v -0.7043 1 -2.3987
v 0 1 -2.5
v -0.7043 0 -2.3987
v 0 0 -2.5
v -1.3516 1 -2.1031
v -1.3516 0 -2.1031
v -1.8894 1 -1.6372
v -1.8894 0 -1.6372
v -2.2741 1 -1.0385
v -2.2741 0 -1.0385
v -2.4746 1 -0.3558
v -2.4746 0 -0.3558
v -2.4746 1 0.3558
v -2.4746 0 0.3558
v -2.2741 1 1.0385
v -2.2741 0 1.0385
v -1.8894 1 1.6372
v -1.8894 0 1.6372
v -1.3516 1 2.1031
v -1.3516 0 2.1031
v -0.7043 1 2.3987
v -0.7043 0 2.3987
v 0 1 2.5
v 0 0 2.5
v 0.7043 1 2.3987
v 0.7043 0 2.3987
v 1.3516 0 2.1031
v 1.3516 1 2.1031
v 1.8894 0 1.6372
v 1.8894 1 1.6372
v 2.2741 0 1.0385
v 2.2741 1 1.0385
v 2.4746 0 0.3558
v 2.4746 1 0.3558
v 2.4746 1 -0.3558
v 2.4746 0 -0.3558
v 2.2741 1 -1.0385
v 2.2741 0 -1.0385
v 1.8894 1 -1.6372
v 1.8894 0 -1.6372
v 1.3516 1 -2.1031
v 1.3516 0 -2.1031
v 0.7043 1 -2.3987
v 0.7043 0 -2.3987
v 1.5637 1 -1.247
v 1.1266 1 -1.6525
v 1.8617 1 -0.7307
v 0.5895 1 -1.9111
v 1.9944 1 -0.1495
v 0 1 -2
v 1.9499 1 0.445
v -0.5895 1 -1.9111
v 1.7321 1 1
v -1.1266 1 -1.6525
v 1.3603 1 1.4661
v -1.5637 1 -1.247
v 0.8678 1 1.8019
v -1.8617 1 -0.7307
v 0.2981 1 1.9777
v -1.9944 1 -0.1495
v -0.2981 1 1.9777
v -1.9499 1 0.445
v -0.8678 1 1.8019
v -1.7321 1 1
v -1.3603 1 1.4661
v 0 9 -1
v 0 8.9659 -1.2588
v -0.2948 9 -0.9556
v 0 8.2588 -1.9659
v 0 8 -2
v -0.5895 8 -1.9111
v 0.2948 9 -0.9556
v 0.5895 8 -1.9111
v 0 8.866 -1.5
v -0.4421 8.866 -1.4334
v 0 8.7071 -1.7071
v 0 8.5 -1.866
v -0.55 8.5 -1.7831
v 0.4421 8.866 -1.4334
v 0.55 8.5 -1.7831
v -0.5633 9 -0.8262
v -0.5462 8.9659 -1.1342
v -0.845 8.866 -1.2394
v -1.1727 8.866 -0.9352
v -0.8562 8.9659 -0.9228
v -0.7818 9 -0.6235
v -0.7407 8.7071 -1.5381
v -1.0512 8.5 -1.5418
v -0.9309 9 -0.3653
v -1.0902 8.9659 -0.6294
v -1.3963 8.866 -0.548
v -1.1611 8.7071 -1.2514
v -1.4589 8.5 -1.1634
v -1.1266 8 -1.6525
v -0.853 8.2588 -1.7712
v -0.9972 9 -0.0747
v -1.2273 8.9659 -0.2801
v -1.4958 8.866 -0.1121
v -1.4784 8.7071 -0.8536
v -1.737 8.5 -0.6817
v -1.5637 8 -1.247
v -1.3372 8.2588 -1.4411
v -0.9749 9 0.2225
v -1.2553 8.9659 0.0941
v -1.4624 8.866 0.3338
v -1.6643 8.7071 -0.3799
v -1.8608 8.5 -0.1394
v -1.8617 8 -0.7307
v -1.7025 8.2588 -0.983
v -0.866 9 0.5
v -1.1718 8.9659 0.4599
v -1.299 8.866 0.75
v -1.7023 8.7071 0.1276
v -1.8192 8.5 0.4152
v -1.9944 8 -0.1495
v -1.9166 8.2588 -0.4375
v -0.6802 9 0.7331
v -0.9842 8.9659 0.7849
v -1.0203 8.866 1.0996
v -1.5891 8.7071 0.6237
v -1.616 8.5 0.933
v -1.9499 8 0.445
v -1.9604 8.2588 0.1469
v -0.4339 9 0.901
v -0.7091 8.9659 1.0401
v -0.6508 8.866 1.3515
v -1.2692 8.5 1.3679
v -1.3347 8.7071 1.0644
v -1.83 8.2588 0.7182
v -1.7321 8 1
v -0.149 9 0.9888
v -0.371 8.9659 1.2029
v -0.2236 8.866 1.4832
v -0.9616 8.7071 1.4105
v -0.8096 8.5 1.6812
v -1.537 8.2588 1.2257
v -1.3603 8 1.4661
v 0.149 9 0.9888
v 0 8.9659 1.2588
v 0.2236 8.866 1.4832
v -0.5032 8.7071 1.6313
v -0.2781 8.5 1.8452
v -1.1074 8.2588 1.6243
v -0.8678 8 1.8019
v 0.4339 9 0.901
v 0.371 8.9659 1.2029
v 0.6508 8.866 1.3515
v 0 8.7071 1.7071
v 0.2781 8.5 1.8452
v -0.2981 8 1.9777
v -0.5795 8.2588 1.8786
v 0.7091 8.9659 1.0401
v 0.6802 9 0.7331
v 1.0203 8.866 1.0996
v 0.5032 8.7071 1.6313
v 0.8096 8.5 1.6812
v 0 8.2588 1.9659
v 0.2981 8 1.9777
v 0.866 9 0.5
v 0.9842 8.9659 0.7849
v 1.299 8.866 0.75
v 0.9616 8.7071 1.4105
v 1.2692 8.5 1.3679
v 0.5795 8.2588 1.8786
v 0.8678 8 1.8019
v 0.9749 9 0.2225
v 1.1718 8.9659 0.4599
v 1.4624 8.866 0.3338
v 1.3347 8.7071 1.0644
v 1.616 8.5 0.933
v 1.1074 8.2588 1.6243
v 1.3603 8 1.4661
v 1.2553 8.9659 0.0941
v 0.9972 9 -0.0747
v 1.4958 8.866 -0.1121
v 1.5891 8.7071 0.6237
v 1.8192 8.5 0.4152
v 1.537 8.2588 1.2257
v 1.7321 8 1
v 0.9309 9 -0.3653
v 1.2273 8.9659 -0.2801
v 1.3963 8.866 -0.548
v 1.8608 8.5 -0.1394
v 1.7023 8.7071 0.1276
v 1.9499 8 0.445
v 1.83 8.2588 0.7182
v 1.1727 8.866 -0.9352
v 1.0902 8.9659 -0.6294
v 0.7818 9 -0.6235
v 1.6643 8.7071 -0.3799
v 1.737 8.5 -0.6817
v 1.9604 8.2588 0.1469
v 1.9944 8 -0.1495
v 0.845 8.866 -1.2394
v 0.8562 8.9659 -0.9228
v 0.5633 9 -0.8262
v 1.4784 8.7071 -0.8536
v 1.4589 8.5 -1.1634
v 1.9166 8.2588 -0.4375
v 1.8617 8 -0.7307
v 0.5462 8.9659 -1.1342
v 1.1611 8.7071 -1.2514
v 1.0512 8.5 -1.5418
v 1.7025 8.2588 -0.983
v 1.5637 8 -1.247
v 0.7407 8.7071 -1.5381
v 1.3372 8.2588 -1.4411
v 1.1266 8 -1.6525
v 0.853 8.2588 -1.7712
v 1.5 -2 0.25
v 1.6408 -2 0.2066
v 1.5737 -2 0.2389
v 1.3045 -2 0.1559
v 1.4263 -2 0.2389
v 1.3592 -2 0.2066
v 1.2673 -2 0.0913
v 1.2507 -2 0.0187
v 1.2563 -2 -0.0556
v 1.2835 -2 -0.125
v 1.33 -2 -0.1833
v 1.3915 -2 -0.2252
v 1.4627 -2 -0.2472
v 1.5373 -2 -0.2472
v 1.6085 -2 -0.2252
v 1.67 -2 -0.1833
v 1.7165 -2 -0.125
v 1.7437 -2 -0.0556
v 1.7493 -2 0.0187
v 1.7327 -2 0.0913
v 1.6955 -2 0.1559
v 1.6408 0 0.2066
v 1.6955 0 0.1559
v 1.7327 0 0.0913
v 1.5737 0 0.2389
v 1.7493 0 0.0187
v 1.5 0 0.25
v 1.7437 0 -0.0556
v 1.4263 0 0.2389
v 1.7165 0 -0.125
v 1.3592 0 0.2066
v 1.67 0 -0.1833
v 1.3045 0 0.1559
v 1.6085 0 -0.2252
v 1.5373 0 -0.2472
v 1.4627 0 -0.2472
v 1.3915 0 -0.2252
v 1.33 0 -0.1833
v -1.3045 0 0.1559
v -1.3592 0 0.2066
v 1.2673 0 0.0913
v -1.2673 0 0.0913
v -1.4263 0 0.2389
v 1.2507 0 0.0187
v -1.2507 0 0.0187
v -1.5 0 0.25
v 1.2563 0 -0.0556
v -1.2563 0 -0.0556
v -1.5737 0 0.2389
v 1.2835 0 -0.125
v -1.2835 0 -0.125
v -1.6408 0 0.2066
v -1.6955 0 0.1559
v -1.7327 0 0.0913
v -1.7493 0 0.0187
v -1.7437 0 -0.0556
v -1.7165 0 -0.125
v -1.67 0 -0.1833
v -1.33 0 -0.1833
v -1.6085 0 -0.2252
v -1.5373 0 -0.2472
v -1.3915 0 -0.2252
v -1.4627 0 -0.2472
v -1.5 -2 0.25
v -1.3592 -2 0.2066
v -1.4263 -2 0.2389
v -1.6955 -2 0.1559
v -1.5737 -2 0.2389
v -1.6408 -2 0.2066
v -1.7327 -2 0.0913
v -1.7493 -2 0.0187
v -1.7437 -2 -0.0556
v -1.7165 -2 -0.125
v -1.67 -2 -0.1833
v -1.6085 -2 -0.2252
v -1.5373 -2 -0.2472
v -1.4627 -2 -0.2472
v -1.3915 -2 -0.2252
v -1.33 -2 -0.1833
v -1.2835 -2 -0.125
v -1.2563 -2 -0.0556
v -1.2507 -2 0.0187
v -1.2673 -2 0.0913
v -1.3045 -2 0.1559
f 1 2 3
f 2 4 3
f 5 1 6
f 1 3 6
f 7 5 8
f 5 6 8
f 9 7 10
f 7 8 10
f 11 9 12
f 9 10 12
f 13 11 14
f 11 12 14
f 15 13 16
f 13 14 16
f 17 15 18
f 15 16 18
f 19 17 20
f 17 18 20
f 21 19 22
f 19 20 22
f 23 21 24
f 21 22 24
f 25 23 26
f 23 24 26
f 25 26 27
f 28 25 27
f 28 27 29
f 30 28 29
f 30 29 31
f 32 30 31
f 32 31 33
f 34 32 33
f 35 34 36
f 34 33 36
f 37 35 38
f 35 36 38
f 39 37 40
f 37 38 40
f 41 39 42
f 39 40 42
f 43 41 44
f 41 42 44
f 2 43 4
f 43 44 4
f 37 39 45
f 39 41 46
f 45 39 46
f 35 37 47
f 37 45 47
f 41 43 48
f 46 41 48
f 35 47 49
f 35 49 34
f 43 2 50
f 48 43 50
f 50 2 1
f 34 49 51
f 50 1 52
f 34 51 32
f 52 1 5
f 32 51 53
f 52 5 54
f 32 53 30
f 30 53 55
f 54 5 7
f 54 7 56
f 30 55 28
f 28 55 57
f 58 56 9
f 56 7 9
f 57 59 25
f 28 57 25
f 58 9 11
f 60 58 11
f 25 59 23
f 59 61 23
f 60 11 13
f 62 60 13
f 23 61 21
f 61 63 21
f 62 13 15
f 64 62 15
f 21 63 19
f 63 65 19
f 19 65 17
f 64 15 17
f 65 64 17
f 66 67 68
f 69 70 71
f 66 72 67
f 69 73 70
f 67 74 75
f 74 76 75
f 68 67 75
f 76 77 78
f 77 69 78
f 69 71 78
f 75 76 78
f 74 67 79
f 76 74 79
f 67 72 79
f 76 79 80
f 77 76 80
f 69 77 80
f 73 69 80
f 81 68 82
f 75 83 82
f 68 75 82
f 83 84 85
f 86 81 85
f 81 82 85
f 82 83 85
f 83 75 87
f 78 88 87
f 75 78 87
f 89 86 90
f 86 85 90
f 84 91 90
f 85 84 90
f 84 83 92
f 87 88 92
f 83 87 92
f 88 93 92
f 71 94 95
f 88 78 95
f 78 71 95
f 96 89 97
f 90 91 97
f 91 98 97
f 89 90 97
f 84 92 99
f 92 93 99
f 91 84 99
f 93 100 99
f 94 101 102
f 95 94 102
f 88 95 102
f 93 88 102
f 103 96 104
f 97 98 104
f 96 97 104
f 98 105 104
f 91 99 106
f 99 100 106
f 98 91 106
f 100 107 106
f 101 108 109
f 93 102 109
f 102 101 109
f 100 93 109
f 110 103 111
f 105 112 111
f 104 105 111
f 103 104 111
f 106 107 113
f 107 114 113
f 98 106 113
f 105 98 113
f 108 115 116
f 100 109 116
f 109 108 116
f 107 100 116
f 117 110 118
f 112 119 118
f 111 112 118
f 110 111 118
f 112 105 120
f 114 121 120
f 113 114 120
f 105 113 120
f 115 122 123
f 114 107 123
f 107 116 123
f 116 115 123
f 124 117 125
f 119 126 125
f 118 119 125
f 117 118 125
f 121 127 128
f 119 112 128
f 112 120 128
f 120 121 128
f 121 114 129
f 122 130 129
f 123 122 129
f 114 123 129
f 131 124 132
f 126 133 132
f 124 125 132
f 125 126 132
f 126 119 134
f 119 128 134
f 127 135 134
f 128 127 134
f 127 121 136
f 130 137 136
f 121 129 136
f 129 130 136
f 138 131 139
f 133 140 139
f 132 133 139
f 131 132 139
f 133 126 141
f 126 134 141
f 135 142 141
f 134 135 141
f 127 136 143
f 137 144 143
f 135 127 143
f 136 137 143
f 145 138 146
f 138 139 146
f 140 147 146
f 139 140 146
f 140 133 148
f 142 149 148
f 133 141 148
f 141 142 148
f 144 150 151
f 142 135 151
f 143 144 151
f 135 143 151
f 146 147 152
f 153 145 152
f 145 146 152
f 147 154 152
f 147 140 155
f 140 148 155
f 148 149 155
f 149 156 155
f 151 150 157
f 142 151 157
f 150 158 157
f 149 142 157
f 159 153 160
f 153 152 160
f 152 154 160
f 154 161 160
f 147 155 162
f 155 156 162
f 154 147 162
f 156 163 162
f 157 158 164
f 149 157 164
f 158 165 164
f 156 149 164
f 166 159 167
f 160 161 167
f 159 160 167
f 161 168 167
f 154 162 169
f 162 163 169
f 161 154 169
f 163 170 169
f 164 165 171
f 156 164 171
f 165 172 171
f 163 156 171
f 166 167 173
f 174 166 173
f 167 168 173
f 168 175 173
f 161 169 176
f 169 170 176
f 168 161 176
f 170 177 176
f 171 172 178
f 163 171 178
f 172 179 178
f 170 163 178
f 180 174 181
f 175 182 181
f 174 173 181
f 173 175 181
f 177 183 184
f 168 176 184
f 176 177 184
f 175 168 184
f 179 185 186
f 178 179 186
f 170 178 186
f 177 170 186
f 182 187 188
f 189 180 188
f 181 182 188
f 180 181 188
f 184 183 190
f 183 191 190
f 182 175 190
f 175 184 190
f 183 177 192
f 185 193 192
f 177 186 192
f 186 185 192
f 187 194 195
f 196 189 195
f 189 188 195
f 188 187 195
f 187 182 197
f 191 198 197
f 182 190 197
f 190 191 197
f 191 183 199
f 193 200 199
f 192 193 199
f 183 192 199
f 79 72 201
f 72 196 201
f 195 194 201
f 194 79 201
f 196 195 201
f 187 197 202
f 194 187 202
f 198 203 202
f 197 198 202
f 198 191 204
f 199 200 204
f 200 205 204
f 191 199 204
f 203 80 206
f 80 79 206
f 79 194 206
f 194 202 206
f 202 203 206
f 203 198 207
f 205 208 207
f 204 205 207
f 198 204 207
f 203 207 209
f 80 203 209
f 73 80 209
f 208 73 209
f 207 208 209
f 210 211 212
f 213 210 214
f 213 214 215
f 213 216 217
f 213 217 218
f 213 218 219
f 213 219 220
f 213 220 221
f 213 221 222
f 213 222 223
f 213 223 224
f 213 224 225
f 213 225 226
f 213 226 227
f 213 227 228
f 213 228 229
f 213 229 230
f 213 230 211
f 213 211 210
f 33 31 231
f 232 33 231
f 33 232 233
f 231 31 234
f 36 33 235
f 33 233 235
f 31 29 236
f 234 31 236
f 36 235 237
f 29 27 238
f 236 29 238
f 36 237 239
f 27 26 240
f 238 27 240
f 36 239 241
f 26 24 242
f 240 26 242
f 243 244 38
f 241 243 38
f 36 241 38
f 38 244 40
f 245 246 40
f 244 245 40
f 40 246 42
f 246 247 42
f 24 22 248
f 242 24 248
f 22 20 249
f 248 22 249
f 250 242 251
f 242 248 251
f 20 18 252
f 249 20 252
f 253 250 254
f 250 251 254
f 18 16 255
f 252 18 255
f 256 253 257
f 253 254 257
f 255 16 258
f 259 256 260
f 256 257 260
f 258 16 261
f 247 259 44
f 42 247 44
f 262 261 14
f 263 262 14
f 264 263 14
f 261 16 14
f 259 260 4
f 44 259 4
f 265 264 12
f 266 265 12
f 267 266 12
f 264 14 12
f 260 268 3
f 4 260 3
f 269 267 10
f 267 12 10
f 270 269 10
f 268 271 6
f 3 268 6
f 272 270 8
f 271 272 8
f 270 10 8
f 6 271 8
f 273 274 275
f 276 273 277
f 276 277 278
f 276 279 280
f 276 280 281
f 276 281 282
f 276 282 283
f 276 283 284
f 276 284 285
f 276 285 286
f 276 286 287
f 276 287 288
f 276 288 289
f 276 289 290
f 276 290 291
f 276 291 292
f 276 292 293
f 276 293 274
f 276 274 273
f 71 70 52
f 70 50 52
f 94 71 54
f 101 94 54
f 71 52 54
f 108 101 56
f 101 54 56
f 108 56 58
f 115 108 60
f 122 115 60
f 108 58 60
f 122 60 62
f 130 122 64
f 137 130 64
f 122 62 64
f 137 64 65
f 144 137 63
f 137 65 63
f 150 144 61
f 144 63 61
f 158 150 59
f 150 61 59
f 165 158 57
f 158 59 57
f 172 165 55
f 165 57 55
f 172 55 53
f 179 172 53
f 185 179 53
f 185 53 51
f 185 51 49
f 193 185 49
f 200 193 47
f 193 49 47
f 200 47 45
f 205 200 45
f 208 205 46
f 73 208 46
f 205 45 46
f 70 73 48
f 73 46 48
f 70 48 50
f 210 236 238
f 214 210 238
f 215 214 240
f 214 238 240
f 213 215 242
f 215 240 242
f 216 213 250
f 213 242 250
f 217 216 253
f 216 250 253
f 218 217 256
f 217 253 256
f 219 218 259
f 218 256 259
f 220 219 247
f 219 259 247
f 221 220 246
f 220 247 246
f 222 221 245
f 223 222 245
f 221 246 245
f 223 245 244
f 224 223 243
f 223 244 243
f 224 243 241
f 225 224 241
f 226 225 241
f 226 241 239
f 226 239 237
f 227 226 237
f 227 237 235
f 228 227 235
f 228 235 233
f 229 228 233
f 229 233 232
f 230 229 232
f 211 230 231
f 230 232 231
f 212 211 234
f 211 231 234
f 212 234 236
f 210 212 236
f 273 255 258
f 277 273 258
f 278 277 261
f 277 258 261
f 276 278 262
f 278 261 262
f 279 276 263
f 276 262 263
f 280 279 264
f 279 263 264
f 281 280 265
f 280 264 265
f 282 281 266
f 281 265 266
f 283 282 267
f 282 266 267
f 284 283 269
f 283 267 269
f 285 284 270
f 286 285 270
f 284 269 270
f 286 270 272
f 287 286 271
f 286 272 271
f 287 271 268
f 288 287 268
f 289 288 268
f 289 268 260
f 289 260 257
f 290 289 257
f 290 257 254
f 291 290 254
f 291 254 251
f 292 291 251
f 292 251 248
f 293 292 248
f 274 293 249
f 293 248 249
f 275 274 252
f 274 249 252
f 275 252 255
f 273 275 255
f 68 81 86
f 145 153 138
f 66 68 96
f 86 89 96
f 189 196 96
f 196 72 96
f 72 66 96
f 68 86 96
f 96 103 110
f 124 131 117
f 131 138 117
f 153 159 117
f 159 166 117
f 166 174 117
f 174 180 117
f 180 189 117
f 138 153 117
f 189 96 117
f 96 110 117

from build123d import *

# Parameters (mm, degrees)
SKETCH2_R           = 0.25
BOSS_EXTRUDE1_DEPTH = 2


with BuildPart() as part:
    # Sketch1 → Revolve1 (revolve)
    with BuildSketch(Plane.XY, mode=Mode.PRIVATE) as revolve1_sk:
        with BuildLine():
            Line((0, 0), (0, 9))
            Line((0, 9), (-1, 9))
            ThreePointArc((-1, 9), (-1.707106781, 8.707106781), (-2, 8))
            Line((-2, 8), (-2, 6))
            Line((-2, 6), (-2, 1))
            Line((-2, 1), (-2.5, 1))
            Line((-2.5, 1), (-2.5, 0))
            Line((-2.5, 0), (0, 0))
        make_face()
    revolve(revolve1_sk.sketch.rotate(Axis((0, 0, 0), (0, 1, 0)), 270), axis=Axis((0, 0, 0), (0, 1, 0)))

    # Sketch2 → Boss-Extrude1 (add)
    with BuildSketch(Plane.XZ):
        with Locations(Location((1.5, 0, 0), (0, 0, 90))):
            Circle(SKETCH2_R)
        with Locations(Location((-1.5, 0, 0), (0, 0, 90))):
            Circle(SKETCH2_R)
    extrude(amount=BOSS_EXTRUDE1_DEPTH)


solid = part.part
